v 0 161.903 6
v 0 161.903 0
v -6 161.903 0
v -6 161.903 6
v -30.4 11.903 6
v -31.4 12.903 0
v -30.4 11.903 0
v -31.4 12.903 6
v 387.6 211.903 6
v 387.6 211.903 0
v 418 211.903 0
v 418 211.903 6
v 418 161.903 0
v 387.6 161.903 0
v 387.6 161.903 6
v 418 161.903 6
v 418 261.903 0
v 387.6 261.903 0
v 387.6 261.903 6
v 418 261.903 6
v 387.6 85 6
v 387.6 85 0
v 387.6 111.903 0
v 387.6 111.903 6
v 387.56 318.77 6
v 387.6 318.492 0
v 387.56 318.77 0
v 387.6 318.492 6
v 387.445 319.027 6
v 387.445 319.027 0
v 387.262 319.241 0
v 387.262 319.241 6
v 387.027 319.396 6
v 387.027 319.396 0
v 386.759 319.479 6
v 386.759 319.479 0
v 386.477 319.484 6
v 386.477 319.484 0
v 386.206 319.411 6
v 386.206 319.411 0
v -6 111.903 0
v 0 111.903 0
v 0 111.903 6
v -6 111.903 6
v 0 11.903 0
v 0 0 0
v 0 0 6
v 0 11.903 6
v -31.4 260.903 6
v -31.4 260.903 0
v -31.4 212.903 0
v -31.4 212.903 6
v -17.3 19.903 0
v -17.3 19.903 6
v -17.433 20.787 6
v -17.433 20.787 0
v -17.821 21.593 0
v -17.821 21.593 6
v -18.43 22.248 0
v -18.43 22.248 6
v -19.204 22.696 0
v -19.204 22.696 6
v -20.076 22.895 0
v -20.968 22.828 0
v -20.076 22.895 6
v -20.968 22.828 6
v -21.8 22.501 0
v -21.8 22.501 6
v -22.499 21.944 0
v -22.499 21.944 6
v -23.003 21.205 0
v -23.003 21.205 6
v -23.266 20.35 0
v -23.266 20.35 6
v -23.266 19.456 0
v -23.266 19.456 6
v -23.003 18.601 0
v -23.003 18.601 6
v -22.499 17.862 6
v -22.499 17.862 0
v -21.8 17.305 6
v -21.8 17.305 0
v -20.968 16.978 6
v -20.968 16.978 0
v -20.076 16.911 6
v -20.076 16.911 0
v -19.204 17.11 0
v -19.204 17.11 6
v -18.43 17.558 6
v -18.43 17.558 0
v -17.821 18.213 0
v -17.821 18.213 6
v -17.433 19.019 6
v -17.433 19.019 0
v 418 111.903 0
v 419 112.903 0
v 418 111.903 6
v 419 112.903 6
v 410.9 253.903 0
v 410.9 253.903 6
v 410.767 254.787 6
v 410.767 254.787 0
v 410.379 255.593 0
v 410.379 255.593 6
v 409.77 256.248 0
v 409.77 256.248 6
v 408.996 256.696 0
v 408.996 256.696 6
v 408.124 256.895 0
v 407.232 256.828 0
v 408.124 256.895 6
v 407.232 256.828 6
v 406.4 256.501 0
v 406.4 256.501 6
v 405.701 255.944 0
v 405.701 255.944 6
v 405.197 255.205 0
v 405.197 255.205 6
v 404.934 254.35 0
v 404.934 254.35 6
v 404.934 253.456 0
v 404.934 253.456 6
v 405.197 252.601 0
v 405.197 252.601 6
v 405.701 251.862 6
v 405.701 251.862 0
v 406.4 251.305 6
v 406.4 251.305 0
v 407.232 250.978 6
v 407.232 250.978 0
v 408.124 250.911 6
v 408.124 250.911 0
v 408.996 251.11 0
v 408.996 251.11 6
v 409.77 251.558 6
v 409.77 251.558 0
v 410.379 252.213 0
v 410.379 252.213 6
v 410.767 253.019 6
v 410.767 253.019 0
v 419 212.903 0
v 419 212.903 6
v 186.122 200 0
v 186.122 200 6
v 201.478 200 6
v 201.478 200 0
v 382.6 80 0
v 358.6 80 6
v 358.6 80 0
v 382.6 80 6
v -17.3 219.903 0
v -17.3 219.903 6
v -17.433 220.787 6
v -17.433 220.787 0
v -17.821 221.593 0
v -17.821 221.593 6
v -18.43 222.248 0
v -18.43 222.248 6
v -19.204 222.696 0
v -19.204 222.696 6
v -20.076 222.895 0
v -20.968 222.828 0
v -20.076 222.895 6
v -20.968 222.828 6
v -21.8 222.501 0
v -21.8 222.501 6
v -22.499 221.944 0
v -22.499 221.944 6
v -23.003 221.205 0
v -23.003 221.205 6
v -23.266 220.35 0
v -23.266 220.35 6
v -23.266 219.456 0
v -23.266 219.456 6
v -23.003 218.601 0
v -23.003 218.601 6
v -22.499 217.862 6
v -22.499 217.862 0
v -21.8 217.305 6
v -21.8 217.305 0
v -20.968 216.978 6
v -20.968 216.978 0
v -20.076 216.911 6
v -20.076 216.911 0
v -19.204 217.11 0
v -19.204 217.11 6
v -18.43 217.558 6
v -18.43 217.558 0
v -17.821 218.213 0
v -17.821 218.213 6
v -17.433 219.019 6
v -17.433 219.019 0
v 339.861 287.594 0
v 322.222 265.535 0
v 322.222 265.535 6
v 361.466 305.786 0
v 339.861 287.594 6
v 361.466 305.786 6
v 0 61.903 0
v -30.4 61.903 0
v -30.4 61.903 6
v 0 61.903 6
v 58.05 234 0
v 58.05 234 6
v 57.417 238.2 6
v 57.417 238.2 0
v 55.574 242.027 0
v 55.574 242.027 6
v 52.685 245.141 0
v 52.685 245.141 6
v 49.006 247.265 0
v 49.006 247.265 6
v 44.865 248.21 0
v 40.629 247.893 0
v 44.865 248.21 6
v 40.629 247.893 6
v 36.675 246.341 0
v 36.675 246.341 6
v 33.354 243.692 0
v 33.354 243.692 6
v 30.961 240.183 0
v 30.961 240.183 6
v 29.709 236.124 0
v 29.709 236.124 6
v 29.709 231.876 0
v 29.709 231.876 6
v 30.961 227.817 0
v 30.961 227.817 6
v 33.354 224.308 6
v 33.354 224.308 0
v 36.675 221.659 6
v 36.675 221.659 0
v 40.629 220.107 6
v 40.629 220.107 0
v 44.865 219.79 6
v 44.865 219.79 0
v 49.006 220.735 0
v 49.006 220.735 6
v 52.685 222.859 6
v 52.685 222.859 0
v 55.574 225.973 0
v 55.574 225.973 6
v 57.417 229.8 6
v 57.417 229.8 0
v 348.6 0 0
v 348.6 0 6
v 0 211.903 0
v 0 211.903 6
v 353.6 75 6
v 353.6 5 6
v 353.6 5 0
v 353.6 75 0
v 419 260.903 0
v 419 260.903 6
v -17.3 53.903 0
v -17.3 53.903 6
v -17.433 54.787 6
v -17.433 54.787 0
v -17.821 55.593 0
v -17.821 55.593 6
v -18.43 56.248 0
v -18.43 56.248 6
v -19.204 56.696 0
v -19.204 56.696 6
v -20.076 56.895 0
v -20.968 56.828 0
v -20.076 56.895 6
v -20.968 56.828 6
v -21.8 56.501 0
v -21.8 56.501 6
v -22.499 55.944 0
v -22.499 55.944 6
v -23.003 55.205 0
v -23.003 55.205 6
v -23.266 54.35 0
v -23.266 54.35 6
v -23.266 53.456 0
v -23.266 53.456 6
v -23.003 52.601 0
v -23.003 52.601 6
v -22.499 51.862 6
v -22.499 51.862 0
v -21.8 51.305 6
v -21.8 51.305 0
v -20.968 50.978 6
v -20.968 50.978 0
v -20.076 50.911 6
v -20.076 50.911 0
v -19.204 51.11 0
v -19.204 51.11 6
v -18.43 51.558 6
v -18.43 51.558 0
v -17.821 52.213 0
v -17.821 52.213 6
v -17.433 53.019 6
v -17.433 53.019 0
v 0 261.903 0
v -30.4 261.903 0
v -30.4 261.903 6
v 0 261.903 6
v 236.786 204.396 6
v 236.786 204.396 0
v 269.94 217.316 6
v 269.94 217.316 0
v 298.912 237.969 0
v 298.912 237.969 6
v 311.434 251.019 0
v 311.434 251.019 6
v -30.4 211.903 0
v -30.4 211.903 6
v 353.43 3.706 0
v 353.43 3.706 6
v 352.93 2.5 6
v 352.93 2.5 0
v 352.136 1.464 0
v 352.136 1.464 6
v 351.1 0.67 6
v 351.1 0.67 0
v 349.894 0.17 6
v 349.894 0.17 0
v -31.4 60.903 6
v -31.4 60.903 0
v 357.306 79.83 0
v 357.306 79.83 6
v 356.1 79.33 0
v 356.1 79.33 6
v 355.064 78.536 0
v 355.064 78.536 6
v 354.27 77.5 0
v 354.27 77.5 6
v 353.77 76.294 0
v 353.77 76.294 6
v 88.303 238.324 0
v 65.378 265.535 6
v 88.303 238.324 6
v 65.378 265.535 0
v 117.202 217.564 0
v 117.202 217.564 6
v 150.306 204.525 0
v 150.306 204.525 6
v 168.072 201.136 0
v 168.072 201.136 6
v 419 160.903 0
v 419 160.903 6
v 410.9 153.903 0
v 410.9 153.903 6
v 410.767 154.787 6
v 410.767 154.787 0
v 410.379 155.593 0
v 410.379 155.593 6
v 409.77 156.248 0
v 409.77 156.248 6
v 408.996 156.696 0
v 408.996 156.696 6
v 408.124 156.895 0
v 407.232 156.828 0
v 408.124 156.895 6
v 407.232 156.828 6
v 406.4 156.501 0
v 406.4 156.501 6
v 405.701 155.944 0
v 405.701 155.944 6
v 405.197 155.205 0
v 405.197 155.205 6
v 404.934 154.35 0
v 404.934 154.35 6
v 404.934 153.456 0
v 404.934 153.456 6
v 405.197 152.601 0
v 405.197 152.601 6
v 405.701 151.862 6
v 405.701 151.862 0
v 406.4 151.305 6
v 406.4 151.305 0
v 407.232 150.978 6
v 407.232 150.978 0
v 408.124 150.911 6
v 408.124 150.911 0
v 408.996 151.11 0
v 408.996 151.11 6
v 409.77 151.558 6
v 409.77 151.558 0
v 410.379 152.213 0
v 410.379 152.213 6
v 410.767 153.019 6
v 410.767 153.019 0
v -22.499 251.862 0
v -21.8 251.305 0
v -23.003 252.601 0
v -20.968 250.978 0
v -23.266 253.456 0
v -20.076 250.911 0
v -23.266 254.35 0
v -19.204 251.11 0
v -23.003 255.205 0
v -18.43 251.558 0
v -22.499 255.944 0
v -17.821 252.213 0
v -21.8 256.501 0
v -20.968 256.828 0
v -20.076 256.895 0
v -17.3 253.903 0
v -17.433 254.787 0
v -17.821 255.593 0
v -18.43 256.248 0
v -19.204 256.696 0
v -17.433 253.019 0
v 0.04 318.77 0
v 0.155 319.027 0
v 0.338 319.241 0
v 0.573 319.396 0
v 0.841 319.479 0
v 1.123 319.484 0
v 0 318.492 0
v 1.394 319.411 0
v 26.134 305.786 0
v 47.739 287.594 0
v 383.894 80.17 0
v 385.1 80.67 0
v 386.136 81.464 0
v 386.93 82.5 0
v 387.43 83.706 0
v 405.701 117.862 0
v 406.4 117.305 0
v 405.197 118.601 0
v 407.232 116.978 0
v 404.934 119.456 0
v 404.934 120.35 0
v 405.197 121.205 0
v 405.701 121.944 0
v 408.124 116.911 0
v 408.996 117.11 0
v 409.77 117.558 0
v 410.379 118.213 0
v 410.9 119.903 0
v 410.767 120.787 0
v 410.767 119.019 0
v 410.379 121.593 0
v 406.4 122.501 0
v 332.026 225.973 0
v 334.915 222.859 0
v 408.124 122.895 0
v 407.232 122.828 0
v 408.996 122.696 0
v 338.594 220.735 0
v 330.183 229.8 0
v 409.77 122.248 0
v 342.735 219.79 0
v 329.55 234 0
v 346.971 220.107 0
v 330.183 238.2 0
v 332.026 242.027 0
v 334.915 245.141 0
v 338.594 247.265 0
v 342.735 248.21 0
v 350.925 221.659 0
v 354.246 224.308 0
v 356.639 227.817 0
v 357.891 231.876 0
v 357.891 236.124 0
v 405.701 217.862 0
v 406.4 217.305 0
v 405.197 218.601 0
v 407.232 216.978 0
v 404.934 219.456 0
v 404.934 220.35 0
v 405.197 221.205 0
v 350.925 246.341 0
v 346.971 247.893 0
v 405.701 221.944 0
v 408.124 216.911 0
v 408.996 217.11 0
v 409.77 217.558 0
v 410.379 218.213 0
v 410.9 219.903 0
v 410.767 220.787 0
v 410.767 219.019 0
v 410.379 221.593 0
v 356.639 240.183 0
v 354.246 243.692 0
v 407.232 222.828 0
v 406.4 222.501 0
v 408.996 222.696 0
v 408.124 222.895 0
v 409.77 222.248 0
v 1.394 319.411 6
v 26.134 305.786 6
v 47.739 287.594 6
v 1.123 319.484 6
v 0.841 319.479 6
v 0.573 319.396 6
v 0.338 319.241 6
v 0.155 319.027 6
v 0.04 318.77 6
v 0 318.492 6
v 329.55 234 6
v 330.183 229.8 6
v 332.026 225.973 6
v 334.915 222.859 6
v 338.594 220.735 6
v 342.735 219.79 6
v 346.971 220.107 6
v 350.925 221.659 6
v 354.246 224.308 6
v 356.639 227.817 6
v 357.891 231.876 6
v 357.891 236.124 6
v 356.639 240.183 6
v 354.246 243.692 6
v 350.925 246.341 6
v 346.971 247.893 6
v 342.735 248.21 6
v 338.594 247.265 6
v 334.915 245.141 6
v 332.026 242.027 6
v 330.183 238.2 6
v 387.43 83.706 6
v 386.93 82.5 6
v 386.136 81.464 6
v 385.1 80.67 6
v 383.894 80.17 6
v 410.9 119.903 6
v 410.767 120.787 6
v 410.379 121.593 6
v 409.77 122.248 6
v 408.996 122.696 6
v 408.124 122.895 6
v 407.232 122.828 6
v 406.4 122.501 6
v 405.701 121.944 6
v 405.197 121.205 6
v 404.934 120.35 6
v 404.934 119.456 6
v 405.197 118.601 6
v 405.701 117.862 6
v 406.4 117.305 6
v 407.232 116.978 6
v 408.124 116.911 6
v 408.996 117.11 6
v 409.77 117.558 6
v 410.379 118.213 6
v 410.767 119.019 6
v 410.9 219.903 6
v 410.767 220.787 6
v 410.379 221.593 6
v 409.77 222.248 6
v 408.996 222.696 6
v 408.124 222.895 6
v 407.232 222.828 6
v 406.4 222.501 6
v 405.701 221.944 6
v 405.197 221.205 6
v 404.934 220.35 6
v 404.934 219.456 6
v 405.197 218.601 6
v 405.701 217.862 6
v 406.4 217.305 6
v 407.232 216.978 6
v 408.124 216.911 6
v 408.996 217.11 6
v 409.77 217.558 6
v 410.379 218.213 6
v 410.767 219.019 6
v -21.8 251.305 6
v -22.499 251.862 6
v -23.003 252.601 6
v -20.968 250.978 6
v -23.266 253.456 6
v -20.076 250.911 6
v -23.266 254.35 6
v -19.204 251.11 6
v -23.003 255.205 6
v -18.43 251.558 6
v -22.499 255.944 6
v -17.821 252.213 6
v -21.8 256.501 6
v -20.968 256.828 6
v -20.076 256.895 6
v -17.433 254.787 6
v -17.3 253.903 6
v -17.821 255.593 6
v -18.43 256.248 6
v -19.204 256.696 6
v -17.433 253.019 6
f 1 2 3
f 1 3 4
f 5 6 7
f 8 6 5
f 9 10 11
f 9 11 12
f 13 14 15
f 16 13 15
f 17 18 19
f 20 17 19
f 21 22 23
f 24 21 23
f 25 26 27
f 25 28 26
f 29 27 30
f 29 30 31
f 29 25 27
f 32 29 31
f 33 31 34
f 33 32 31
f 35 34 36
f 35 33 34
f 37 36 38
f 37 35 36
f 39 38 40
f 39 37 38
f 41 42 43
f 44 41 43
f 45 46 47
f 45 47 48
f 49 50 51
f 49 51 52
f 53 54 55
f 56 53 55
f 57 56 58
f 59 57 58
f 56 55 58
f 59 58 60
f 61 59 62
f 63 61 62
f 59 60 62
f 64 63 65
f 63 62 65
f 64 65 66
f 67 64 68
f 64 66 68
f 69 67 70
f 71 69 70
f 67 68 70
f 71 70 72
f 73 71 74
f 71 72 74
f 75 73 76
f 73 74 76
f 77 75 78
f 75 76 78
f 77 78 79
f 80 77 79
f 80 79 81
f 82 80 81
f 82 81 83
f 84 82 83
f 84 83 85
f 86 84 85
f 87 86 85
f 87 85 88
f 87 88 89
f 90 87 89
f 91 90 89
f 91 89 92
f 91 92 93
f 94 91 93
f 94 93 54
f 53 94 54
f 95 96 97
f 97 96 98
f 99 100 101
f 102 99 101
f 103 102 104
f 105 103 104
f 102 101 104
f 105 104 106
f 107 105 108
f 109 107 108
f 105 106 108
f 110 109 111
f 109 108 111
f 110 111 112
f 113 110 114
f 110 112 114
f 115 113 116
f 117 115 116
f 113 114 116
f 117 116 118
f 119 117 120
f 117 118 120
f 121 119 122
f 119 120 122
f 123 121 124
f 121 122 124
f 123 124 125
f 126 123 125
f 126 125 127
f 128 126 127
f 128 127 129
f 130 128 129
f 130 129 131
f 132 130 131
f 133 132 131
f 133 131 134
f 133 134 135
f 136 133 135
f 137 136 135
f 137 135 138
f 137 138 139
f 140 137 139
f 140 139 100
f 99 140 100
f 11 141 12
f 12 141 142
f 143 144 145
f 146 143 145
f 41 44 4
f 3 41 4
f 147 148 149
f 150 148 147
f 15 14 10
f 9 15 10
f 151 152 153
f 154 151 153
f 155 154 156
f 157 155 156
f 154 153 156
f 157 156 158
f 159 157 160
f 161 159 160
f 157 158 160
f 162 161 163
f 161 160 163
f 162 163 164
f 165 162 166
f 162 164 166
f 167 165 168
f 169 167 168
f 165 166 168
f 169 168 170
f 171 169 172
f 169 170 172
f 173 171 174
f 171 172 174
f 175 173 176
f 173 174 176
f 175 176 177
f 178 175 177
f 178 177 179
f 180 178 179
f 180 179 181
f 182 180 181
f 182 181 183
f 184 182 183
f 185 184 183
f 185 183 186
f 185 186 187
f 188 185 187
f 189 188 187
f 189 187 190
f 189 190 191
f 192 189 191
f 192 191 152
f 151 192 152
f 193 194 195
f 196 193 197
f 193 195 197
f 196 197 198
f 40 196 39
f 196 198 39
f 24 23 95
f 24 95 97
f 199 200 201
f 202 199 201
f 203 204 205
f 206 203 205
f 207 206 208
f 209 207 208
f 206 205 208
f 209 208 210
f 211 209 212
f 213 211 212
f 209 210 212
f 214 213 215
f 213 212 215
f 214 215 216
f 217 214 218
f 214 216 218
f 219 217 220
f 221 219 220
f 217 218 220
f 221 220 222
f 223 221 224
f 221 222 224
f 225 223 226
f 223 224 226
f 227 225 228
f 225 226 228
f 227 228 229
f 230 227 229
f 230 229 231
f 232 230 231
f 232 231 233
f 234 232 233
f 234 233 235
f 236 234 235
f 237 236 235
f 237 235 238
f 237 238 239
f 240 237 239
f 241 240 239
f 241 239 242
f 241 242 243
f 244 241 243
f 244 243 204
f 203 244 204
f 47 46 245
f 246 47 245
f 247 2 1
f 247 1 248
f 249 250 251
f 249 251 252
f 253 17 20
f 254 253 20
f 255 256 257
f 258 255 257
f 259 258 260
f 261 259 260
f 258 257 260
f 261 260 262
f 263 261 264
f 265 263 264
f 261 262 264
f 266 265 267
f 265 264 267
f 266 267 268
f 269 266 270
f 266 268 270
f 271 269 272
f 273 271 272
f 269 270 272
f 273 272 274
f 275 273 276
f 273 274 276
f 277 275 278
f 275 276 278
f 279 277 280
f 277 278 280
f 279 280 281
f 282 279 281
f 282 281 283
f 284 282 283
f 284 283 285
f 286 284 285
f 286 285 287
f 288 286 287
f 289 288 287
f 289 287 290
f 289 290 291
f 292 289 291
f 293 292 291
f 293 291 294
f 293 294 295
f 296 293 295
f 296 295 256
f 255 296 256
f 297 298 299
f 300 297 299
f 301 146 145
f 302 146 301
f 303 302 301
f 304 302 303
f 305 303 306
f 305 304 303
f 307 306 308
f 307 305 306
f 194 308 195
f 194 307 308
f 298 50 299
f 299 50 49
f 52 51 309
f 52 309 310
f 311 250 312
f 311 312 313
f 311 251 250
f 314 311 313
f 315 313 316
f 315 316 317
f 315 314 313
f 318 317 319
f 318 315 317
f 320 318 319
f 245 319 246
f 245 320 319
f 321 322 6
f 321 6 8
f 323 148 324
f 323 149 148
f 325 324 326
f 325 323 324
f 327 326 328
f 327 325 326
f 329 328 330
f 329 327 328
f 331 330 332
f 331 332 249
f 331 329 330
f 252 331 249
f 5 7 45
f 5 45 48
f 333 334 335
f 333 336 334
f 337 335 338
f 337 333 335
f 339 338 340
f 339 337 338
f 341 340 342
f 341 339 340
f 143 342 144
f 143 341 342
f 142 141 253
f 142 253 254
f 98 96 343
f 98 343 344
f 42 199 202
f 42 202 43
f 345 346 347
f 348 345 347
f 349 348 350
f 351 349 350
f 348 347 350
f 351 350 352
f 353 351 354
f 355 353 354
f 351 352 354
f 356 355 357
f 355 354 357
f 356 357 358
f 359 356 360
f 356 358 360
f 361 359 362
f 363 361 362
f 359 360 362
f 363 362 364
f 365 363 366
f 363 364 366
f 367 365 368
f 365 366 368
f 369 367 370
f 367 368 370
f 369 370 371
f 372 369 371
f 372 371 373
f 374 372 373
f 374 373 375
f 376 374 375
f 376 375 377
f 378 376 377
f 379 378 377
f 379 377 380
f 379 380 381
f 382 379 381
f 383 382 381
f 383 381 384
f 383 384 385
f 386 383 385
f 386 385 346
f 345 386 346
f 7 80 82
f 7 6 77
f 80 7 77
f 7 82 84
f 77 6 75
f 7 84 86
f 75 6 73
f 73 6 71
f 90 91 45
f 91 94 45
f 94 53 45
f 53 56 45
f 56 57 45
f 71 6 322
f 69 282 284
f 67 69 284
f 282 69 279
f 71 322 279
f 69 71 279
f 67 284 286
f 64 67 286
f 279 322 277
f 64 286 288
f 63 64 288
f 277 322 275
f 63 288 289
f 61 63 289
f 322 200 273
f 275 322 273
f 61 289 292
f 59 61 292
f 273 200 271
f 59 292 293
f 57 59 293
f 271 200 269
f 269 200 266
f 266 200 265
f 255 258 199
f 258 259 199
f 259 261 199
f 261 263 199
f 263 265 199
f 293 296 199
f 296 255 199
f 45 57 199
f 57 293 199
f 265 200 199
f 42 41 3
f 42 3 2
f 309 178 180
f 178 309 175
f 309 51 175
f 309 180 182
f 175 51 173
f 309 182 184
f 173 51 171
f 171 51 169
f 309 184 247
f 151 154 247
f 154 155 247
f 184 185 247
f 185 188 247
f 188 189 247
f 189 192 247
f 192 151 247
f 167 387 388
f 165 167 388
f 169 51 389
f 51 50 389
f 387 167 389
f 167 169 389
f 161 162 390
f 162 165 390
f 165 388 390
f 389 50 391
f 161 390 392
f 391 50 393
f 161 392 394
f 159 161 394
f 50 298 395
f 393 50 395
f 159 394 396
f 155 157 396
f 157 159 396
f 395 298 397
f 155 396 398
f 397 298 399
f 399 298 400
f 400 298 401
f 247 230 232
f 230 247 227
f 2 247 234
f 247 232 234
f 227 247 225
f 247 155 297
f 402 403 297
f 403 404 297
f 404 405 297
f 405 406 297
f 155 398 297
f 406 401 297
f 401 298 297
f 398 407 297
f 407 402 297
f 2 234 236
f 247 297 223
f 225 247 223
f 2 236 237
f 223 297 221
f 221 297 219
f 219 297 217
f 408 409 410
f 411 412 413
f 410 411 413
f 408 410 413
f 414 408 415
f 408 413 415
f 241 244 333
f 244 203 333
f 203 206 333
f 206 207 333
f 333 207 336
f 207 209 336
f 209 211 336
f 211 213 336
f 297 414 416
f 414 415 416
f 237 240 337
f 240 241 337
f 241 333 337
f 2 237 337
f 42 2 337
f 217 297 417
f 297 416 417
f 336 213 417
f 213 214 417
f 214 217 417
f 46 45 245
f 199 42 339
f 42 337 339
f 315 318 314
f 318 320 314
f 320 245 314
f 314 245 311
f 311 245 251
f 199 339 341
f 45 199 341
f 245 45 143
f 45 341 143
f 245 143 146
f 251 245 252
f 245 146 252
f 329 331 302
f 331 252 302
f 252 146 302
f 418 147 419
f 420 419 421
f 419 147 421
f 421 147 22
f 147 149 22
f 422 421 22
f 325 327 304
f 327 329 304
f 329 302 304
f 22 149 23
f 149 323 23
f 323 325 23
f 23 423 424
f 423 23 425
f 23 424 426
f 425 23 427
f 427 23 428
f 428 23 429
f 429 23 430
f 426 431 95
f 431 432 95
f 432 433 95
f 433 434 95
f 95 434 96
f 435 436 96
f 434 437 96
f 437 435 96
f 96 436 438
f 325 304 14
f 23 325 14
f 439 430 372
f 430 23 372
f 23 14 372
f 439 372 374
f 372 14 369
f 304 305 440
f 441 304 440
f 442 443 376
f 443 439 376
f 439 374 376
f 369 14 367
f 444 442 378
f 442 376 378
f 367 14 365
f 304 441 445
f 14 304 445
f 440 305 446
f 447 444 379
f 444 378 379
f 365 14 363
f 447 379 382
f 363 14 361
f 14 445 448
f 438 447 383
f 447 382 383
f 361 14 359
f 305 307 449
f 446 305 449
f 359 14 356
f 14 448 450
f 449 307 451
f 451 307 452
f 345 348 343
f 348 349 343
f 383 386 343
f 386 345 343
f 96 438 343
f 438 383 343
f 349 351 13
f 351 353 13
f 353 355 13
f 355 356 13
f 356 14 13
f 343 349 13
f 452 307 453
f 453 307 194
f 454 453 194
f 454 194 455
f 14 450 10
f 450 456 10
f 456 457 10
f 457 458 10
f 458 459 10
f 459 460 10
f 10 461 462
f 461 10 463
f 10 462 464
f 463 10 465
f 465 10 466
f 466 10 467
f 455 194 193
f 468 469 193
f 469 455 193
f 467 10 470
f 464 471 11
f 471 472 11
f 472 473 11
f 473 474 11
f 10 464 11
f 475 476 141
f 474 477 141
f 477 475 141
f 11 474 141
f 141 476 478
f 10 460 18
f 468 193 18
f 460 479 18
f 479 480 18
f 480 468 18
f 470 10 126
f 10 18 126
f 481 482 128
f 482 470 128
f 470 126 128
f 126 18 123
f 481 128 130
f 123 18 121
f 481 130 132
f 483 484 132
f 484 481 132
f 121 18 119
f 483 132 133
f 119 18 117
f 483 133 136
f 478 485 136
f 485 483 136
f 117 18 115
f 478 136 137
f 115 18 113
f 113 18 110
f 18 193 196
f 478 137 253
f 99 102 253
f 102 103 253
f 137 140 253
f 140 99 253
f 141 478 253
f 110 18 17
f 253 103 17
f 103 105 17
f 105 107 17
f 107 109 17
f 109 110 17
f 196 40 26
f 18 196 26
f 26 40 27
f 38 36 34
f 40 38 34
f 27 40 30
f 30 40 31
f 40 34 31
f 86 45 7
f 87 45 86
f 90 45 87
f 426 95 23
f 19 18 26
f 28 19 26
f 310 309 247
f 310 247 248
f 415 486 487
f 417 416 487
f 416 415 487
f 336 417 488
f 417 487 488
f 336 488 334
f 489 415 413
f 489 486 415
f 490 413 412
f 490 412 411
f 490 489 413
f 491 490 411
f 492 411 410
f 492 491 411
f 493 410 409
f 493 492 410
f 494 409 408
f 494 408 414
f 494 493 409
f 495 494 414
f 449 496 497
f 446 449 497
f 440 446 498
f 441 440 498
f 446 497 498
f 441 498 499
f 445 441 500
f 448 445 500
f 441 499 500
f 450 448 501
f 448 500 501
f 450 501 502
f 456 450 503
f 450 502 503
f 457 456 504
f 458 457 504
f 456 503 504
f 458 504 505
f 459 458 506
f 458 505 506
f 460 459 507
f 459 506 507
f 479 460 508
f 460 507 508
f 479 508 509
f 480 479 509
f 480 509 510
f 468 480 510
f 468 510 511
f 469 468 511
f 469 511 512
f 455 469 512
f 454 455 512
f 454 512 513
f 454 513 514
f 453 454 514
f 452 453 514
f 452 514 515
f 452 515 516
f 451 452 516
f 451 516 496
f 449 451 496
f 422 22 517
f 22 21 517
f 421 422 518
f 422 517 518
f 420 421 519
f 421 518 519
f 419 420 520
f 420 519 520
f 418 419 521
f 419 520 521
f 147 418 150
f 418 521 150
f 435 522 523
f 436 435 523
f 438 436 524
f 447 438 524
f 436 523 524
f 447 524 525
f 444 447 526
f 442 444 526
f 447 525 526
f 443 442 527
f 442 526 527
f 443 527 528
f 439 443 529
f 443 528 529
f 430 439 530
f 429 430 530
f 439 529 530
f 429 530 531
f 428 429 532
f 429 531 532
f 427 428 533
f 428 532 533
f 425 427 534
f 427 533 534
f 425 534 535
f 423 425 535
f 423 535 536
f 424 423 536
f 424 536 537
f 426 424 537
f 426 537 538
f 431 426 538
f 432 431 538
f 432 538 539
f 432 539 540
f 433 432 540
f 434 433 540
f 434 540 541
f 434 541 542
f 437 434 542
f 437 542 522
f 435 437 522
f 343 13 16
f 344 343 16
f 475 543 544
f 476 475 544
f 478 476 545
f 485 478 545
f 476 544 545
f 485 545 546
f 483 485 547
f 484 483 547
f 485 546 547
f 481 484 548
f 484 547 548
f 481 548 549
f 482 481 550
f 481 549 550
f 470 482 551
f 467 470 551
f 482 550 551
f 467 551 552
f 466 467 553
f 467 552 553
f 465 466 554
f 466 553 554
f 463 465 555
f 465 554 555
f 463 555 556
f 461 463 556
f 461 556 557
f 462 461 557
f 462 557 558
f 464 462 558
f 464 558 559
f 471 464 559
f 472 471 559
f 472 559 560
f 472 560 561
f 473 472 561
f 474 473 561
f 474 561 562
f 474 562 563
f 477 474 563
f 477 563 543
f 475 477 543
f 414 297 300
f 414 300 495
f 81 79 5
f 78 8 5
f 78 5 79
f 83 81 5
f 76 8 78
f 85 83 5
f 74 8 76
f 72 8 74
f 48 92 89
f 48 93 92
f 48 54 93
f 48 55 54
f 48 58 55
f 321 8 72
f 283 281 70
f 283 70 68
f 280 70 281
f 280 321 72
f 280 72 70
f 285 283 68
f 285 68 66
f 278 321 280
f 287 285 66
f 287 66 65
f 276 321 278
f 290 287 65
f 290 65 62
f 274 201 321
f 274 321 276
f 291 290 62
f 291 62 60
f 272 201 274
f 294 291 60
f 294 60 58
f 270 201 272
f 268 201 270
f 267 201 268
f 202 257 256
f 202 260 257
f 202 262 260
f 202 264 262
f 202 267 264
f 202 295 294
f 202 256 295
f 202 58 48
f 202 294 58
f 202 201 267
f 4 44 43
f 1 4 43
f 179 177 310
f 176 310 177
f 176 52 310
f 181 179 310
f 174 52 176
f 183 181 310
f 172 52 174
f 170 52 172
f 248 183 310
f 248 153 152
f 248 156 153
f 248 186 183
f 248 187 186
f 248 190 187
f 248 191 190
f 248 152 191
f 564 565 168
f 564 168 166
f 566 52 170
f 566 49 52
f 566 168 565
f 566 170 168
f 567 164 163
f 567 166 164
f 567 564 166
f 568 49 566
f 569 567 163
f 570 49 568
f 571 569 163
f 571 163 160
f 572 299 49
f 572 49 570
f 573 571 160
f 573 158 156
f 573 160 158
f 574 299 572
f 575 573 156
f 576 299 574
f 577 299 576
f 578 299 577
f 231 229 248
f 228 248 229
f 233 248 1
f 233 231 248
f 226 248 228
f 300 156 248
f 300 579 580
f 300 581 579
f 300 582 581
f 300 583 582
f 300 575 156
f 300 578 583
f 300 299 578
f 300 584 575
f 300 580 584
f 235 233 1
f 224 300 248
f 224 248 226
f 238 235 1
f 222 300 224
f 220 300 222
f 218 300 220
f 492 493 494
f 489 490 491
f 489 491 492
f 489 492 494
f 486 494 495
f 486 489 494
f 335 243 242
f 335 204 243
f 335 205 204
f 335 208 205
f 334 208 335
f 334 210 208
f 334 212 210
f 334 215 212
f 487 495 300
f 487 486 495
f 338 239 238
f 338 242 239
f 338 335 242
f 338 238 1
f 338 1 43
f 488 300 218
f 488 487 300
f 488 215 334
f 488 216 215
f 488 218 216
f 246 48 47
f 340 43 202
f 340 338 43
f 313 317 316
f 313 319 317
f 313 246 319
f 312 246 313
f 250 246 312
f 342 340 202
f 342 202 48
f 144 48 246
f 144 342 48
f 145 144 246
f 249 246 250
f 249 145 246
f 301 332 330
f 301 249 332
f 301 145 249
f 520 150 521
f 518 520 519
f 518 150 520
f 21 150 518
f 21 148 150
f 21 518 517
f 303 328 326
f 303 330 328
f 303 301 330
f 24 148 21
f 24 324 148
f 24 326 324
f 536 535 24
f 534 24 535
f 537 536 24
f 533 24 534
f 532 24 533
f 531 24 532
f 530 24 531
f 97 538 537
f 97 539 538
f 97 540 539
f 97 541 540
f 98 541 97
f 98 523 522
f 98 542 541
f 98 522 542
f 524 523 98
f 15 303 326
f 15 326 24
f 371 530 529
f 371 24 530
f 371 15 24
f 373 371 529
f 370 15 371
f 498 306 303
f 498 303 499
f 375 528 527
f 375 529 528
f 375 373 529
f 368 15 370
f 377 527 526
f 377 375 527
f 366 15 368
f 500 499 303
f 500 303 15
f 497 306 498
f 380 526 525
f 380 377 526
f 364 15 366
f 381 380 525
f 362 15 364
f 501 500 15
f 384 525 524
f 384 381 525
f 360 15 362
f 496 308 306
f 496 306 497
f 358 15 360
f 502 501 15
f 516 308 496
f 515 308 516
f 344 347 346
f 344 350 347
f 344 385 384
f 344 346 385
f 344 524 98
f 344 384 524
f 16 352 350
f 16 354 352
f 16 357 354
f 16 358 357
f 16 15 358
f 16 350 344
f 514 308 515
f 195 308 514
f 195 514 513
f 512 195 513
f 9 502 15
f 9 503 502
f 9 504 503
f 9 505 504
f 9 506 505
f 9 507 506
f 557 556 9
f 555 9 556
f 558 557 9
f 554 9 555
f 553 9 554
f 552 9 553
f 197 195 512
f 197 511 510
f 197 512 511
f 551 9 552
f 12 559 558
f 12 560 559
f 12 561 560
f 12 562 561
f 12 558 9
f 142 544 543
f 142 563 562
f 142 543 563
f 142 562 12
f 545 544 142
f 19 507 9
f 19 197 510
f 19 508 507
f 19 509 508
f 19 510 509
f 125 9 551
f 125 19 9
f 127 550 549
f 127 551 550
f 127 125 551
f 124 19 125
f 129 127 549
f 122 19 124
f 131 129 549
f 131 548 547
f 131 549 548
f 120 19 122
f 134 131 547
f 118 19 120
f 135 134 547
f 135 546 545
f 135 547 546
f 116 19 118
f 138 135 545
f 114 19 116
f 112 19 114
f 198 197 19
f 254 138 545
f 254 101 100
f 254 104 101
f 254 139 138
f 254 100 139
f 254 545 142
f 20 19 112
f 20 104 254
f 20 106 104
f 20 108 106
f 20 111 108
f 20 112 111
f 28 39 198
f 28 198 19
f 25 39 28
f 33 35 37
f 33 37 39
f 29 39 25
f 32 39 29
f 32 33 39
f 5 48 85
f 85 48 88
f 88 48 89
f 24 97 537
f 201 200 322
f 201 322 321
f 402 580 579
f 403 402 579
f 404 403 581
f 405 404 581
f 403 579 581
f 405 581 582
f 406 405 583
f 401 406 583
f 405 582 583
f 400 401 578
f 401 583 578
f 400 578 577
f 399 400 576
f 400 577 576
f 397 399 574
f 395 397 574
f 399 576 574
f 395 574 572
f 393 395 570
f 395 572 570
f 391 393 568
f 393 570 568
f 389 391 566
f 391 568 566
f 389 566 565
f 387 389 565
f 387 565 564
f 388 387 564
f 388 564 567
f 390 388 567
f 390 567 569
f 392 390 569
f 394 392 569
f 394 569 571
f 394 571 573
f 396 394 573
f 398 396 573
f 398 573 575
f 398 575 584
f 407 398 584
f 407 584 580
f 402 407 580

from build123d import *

# Parameters (mm, degrees)
ESBO_O1_W                = 387.6
ESBO_O1_H                = 320
RESSALTO_EXTRUS_O1_DEPTH = 6
CORTE_EXTRUS_O1_DEPTH    = 503.662670187
ESBO_O3_R                = 14.25
CORTE_EXTRUS_O2_DEPTH    = 503.662670187
FILETE1_R                = 144
FILETE2_R                = 144
ESBO_O4_W                = 6
ESBO_O4_H                = 50
RESSALTO_EXTRUS_O2_DEPTH = 31.4
ESBO_O5_W                = 25.4
ESBO_O5_H                = 50
CORTE_EXTRUS_O3_DEPTH    = 528.25420828
ESBO_O6_W                = 40
ESBO_O6_H                = 80
CORTE_EXTRUS_O4_DEPTH    = 528.25420828
FILETE3_R                = 5
CHANFRO1_SIZE            = 1
FILETE4_R                = 1
ESBO_O8_R                = 3
CORTE_EXTRUS_O5_DEPTH    = 527.945845339


with BuildPart() as part:
    # Esboço1 → Ressalto-extrusão1 (new body)
    with BuildSketch(Plane.XY):
        with Locations((193.8, 160)):
            Rectangle(ESBO_O1_W, ESBO_O1_H)
    extrude(amount=RESSALTO_EXTRUS_O1_DEPTH)

    # Esboço2 → Corte-extrusão1 (cut, through all)
    with BuildSketch(Plane.XY.offset(6)):
        Polygon((33.8, 320), (103.8, 200), (283.8, 200), (353.8, 320), align=None)
    extrude(amount=-CORTE_EXTRUS_O1_DEPTH, mode=Mode.SUBTRACT)

    # Esboço3 → Corte-extrusão2 (cut, through all)
    with BuildSketch(Plane.XY.offset(6)):
        with Locations((43.8, 234)):
            Circle(ESBO_O3_R)
        with Locations(Location((343.8, 234, 0), (0, 0, 180))):
            Circle(ESBO_O3_R)
    extrude(amount=-CORTE_EXTRUS_O2_DEPTH, mode=Mode.SUBTRACT)

    # Filete1
    # the kernel refuses this fillet: 144 mm, written as the material it takes off along each edge
    with BuildSketch(Plane(origin=(353.8, 320, 180.735732562), x_dir=(1, 0, 0), z_dir=(0, 0, -1))) as filete1_piece_1:
        with BuildLine():
            CenterArc((89.166452625, 132.930643283), FILETE1_R, 210.256437164, 37.131526626)
            Line((-35.217709105, 60.373215608), (-37.705392339, 58.922067054))
            Line((-37.705392339, 58.922067054), (-2.487683235, -1.451148554))
            Line((-2.487683235, -1.451148554), (0, -2.88))
            ThreePointArc((0, -2.88), (16.9, -2.88), (32.692670948, -2.658612866))
            Line((32.692670948, -2.658612866), (33.8, 0))
        make_face()
    extrude(amount=355.471465124, mode=Mode.SUBTRACT)
    with BuildSketch(Plane(origin=(33.8, 320, 180.735732562), x_dir=(-1, 0, 0), z_dir=(0, 0, -1))) as filete1_piece_2:
        with BuildLine():
            CenterArc((89.166452625, -132.930643283), FILETE1_R, 112.612036211, 37.131526626)
            Line((-35.217709105, -60.373215608), (-37.705392339, -58.922067054))
            Line((-37.705392339, -58.922067054), (-2.487683235, 1.451148554))
            Line((-2.487683235, 1.451148554), (0, 2.88))
            ThreePointArc((0, 2.88), (16.9, 2.88), (32.692670948, 2.658612866))
            Line((32.692670948, 2.658612866), (33.8, 0))
        make_face()
    extrude(amount=355.471465124, mode=Mode.SUBTRACT)

    # Filete2
    filete2_edges = [part.edges().sort_by_distance(p)[0] for p in [
        (283.8, 200, 3),
        (103.8, 200, 3),
    ]]
    fillet(filete2_edges, radius=FILETE2_R)

    # Esboço4 → Ressalto-extrusão2 (add)
    with BuildSketch(Plane.ZY):
        with Locations((3, 236.902997942)):
            Rectangle(ESBO_O4_W, ESBO_O4_H)
        with Locations((3, 136.902997942)):
            Rectangle(ESBO_O4_W, ESBO_O4_H)
        with Locations((3, 36.902997942)):
            Rectangle(ESBO_O4_W, ESBO_O4_H)
    ressalto_extrus_o2 = extrude(amount=RESSALTO_EXTRUS_O2_DEPTH)

    # Espelhar1: Ressalto-extrusão2 across plane
    add(ressalto_extrus_o2.mirror(Plane.ZY.offset(-193.8)))

    # Esboço5 → Corte-extrusão3 (cut, through all)
    with BuildSketch(Plane.XY.offset(6)):
        with Locations((406.3, 36.902997942)):
            Rectangle(ESBO_O5_W, ESBO_O5_H)
        with Locations((-18.7, 136.902997942)):
            Rectangle(ESBO_O5_W, ESBO_O5_H)
    extrude(amount=-CORTE_EXTRUS_O3_DEPTH, mode=Mode.SUBTRACT)

    # Esboço6 → Corte-extrusão4 (cut, through all)
    with BuildSketch(Plane.XY.offset(6)):
        with Locations((373.6, 40)):
            Rectangle(ESBO_O6_W, ESBO_O6_H)
    extrude(amount=-CORTE_EXTRUS_O4_DEPTH, mode=Mode.SUBTRACT)

    # Filete3
    filete3_edges = [part.edges().sort_by_distance(p)[0] for p in [
        (387.6, 80, 3),
        (353.6, 80, 3),
        (353.6, 0, 3),
    ]]
    fillet(filete3_edges, radius=FILETE3_R)

    # Chanfro1
    chanfro1_edges = [part.edges().sort_by_distance(p)[0] for p in [
        (-31.4, 61.902997942, 3),
        (-31.4, 11.902997942, 3),
        (419, 261.902997942, 3),
        (419, 211.902997942, 3),
        (419, 161.902997942, 3),
        (419, 111.902997942, 3),
        (-31.4, 261.902997942, 3),
        (-31.4, 211.902997942, 3),
    ]]
    chamfer(chanfro1_edges, length=CHANFRO1_SIZE)

    # Filete4
    filete4_edges = [part.edges().sort_by_distance(p)[0] for p in [
        (0, 320, 3),
        (387.6, 320, 3),
    ]]
    fillet(filete4_edges, radius=FILETE4_R)

    # Esboço8 → Corte-extrusão5 (cut, through all)
    with BuildSketch(Plane.XY.offset(6)):
        with Locations((407.9, 253.902997942)):
            Circle(ESBO_O8_R)
        with Locations((407.9, 219.902997942)):
            Circle(ESBO_O8_R)
        with Locations((407.9, 153.902997942)):
            Circle(ESBO_O8_R)
        with Locations((407.9, 119.902997942)):
            Circle(ESBO_O8_R)
        with Locations((-20.3, 19.902997942)):
            Circle(ESBO_O8_R)
        with Locations((-20.3, 53.902997942)):
            Circle(ESBO_O8_R)
        with Locations((-20.3, 219.902997942)):
            Circle(ESBO_O8_R)
        with Locations((-20.3, 253.902997942)):
            Circle(ESBO_O8_R)
    extrude(amount=-CORTE_EXTRUS_O5_DEPTH, mode=Mode.SUBTRACT)


solid = part.part
